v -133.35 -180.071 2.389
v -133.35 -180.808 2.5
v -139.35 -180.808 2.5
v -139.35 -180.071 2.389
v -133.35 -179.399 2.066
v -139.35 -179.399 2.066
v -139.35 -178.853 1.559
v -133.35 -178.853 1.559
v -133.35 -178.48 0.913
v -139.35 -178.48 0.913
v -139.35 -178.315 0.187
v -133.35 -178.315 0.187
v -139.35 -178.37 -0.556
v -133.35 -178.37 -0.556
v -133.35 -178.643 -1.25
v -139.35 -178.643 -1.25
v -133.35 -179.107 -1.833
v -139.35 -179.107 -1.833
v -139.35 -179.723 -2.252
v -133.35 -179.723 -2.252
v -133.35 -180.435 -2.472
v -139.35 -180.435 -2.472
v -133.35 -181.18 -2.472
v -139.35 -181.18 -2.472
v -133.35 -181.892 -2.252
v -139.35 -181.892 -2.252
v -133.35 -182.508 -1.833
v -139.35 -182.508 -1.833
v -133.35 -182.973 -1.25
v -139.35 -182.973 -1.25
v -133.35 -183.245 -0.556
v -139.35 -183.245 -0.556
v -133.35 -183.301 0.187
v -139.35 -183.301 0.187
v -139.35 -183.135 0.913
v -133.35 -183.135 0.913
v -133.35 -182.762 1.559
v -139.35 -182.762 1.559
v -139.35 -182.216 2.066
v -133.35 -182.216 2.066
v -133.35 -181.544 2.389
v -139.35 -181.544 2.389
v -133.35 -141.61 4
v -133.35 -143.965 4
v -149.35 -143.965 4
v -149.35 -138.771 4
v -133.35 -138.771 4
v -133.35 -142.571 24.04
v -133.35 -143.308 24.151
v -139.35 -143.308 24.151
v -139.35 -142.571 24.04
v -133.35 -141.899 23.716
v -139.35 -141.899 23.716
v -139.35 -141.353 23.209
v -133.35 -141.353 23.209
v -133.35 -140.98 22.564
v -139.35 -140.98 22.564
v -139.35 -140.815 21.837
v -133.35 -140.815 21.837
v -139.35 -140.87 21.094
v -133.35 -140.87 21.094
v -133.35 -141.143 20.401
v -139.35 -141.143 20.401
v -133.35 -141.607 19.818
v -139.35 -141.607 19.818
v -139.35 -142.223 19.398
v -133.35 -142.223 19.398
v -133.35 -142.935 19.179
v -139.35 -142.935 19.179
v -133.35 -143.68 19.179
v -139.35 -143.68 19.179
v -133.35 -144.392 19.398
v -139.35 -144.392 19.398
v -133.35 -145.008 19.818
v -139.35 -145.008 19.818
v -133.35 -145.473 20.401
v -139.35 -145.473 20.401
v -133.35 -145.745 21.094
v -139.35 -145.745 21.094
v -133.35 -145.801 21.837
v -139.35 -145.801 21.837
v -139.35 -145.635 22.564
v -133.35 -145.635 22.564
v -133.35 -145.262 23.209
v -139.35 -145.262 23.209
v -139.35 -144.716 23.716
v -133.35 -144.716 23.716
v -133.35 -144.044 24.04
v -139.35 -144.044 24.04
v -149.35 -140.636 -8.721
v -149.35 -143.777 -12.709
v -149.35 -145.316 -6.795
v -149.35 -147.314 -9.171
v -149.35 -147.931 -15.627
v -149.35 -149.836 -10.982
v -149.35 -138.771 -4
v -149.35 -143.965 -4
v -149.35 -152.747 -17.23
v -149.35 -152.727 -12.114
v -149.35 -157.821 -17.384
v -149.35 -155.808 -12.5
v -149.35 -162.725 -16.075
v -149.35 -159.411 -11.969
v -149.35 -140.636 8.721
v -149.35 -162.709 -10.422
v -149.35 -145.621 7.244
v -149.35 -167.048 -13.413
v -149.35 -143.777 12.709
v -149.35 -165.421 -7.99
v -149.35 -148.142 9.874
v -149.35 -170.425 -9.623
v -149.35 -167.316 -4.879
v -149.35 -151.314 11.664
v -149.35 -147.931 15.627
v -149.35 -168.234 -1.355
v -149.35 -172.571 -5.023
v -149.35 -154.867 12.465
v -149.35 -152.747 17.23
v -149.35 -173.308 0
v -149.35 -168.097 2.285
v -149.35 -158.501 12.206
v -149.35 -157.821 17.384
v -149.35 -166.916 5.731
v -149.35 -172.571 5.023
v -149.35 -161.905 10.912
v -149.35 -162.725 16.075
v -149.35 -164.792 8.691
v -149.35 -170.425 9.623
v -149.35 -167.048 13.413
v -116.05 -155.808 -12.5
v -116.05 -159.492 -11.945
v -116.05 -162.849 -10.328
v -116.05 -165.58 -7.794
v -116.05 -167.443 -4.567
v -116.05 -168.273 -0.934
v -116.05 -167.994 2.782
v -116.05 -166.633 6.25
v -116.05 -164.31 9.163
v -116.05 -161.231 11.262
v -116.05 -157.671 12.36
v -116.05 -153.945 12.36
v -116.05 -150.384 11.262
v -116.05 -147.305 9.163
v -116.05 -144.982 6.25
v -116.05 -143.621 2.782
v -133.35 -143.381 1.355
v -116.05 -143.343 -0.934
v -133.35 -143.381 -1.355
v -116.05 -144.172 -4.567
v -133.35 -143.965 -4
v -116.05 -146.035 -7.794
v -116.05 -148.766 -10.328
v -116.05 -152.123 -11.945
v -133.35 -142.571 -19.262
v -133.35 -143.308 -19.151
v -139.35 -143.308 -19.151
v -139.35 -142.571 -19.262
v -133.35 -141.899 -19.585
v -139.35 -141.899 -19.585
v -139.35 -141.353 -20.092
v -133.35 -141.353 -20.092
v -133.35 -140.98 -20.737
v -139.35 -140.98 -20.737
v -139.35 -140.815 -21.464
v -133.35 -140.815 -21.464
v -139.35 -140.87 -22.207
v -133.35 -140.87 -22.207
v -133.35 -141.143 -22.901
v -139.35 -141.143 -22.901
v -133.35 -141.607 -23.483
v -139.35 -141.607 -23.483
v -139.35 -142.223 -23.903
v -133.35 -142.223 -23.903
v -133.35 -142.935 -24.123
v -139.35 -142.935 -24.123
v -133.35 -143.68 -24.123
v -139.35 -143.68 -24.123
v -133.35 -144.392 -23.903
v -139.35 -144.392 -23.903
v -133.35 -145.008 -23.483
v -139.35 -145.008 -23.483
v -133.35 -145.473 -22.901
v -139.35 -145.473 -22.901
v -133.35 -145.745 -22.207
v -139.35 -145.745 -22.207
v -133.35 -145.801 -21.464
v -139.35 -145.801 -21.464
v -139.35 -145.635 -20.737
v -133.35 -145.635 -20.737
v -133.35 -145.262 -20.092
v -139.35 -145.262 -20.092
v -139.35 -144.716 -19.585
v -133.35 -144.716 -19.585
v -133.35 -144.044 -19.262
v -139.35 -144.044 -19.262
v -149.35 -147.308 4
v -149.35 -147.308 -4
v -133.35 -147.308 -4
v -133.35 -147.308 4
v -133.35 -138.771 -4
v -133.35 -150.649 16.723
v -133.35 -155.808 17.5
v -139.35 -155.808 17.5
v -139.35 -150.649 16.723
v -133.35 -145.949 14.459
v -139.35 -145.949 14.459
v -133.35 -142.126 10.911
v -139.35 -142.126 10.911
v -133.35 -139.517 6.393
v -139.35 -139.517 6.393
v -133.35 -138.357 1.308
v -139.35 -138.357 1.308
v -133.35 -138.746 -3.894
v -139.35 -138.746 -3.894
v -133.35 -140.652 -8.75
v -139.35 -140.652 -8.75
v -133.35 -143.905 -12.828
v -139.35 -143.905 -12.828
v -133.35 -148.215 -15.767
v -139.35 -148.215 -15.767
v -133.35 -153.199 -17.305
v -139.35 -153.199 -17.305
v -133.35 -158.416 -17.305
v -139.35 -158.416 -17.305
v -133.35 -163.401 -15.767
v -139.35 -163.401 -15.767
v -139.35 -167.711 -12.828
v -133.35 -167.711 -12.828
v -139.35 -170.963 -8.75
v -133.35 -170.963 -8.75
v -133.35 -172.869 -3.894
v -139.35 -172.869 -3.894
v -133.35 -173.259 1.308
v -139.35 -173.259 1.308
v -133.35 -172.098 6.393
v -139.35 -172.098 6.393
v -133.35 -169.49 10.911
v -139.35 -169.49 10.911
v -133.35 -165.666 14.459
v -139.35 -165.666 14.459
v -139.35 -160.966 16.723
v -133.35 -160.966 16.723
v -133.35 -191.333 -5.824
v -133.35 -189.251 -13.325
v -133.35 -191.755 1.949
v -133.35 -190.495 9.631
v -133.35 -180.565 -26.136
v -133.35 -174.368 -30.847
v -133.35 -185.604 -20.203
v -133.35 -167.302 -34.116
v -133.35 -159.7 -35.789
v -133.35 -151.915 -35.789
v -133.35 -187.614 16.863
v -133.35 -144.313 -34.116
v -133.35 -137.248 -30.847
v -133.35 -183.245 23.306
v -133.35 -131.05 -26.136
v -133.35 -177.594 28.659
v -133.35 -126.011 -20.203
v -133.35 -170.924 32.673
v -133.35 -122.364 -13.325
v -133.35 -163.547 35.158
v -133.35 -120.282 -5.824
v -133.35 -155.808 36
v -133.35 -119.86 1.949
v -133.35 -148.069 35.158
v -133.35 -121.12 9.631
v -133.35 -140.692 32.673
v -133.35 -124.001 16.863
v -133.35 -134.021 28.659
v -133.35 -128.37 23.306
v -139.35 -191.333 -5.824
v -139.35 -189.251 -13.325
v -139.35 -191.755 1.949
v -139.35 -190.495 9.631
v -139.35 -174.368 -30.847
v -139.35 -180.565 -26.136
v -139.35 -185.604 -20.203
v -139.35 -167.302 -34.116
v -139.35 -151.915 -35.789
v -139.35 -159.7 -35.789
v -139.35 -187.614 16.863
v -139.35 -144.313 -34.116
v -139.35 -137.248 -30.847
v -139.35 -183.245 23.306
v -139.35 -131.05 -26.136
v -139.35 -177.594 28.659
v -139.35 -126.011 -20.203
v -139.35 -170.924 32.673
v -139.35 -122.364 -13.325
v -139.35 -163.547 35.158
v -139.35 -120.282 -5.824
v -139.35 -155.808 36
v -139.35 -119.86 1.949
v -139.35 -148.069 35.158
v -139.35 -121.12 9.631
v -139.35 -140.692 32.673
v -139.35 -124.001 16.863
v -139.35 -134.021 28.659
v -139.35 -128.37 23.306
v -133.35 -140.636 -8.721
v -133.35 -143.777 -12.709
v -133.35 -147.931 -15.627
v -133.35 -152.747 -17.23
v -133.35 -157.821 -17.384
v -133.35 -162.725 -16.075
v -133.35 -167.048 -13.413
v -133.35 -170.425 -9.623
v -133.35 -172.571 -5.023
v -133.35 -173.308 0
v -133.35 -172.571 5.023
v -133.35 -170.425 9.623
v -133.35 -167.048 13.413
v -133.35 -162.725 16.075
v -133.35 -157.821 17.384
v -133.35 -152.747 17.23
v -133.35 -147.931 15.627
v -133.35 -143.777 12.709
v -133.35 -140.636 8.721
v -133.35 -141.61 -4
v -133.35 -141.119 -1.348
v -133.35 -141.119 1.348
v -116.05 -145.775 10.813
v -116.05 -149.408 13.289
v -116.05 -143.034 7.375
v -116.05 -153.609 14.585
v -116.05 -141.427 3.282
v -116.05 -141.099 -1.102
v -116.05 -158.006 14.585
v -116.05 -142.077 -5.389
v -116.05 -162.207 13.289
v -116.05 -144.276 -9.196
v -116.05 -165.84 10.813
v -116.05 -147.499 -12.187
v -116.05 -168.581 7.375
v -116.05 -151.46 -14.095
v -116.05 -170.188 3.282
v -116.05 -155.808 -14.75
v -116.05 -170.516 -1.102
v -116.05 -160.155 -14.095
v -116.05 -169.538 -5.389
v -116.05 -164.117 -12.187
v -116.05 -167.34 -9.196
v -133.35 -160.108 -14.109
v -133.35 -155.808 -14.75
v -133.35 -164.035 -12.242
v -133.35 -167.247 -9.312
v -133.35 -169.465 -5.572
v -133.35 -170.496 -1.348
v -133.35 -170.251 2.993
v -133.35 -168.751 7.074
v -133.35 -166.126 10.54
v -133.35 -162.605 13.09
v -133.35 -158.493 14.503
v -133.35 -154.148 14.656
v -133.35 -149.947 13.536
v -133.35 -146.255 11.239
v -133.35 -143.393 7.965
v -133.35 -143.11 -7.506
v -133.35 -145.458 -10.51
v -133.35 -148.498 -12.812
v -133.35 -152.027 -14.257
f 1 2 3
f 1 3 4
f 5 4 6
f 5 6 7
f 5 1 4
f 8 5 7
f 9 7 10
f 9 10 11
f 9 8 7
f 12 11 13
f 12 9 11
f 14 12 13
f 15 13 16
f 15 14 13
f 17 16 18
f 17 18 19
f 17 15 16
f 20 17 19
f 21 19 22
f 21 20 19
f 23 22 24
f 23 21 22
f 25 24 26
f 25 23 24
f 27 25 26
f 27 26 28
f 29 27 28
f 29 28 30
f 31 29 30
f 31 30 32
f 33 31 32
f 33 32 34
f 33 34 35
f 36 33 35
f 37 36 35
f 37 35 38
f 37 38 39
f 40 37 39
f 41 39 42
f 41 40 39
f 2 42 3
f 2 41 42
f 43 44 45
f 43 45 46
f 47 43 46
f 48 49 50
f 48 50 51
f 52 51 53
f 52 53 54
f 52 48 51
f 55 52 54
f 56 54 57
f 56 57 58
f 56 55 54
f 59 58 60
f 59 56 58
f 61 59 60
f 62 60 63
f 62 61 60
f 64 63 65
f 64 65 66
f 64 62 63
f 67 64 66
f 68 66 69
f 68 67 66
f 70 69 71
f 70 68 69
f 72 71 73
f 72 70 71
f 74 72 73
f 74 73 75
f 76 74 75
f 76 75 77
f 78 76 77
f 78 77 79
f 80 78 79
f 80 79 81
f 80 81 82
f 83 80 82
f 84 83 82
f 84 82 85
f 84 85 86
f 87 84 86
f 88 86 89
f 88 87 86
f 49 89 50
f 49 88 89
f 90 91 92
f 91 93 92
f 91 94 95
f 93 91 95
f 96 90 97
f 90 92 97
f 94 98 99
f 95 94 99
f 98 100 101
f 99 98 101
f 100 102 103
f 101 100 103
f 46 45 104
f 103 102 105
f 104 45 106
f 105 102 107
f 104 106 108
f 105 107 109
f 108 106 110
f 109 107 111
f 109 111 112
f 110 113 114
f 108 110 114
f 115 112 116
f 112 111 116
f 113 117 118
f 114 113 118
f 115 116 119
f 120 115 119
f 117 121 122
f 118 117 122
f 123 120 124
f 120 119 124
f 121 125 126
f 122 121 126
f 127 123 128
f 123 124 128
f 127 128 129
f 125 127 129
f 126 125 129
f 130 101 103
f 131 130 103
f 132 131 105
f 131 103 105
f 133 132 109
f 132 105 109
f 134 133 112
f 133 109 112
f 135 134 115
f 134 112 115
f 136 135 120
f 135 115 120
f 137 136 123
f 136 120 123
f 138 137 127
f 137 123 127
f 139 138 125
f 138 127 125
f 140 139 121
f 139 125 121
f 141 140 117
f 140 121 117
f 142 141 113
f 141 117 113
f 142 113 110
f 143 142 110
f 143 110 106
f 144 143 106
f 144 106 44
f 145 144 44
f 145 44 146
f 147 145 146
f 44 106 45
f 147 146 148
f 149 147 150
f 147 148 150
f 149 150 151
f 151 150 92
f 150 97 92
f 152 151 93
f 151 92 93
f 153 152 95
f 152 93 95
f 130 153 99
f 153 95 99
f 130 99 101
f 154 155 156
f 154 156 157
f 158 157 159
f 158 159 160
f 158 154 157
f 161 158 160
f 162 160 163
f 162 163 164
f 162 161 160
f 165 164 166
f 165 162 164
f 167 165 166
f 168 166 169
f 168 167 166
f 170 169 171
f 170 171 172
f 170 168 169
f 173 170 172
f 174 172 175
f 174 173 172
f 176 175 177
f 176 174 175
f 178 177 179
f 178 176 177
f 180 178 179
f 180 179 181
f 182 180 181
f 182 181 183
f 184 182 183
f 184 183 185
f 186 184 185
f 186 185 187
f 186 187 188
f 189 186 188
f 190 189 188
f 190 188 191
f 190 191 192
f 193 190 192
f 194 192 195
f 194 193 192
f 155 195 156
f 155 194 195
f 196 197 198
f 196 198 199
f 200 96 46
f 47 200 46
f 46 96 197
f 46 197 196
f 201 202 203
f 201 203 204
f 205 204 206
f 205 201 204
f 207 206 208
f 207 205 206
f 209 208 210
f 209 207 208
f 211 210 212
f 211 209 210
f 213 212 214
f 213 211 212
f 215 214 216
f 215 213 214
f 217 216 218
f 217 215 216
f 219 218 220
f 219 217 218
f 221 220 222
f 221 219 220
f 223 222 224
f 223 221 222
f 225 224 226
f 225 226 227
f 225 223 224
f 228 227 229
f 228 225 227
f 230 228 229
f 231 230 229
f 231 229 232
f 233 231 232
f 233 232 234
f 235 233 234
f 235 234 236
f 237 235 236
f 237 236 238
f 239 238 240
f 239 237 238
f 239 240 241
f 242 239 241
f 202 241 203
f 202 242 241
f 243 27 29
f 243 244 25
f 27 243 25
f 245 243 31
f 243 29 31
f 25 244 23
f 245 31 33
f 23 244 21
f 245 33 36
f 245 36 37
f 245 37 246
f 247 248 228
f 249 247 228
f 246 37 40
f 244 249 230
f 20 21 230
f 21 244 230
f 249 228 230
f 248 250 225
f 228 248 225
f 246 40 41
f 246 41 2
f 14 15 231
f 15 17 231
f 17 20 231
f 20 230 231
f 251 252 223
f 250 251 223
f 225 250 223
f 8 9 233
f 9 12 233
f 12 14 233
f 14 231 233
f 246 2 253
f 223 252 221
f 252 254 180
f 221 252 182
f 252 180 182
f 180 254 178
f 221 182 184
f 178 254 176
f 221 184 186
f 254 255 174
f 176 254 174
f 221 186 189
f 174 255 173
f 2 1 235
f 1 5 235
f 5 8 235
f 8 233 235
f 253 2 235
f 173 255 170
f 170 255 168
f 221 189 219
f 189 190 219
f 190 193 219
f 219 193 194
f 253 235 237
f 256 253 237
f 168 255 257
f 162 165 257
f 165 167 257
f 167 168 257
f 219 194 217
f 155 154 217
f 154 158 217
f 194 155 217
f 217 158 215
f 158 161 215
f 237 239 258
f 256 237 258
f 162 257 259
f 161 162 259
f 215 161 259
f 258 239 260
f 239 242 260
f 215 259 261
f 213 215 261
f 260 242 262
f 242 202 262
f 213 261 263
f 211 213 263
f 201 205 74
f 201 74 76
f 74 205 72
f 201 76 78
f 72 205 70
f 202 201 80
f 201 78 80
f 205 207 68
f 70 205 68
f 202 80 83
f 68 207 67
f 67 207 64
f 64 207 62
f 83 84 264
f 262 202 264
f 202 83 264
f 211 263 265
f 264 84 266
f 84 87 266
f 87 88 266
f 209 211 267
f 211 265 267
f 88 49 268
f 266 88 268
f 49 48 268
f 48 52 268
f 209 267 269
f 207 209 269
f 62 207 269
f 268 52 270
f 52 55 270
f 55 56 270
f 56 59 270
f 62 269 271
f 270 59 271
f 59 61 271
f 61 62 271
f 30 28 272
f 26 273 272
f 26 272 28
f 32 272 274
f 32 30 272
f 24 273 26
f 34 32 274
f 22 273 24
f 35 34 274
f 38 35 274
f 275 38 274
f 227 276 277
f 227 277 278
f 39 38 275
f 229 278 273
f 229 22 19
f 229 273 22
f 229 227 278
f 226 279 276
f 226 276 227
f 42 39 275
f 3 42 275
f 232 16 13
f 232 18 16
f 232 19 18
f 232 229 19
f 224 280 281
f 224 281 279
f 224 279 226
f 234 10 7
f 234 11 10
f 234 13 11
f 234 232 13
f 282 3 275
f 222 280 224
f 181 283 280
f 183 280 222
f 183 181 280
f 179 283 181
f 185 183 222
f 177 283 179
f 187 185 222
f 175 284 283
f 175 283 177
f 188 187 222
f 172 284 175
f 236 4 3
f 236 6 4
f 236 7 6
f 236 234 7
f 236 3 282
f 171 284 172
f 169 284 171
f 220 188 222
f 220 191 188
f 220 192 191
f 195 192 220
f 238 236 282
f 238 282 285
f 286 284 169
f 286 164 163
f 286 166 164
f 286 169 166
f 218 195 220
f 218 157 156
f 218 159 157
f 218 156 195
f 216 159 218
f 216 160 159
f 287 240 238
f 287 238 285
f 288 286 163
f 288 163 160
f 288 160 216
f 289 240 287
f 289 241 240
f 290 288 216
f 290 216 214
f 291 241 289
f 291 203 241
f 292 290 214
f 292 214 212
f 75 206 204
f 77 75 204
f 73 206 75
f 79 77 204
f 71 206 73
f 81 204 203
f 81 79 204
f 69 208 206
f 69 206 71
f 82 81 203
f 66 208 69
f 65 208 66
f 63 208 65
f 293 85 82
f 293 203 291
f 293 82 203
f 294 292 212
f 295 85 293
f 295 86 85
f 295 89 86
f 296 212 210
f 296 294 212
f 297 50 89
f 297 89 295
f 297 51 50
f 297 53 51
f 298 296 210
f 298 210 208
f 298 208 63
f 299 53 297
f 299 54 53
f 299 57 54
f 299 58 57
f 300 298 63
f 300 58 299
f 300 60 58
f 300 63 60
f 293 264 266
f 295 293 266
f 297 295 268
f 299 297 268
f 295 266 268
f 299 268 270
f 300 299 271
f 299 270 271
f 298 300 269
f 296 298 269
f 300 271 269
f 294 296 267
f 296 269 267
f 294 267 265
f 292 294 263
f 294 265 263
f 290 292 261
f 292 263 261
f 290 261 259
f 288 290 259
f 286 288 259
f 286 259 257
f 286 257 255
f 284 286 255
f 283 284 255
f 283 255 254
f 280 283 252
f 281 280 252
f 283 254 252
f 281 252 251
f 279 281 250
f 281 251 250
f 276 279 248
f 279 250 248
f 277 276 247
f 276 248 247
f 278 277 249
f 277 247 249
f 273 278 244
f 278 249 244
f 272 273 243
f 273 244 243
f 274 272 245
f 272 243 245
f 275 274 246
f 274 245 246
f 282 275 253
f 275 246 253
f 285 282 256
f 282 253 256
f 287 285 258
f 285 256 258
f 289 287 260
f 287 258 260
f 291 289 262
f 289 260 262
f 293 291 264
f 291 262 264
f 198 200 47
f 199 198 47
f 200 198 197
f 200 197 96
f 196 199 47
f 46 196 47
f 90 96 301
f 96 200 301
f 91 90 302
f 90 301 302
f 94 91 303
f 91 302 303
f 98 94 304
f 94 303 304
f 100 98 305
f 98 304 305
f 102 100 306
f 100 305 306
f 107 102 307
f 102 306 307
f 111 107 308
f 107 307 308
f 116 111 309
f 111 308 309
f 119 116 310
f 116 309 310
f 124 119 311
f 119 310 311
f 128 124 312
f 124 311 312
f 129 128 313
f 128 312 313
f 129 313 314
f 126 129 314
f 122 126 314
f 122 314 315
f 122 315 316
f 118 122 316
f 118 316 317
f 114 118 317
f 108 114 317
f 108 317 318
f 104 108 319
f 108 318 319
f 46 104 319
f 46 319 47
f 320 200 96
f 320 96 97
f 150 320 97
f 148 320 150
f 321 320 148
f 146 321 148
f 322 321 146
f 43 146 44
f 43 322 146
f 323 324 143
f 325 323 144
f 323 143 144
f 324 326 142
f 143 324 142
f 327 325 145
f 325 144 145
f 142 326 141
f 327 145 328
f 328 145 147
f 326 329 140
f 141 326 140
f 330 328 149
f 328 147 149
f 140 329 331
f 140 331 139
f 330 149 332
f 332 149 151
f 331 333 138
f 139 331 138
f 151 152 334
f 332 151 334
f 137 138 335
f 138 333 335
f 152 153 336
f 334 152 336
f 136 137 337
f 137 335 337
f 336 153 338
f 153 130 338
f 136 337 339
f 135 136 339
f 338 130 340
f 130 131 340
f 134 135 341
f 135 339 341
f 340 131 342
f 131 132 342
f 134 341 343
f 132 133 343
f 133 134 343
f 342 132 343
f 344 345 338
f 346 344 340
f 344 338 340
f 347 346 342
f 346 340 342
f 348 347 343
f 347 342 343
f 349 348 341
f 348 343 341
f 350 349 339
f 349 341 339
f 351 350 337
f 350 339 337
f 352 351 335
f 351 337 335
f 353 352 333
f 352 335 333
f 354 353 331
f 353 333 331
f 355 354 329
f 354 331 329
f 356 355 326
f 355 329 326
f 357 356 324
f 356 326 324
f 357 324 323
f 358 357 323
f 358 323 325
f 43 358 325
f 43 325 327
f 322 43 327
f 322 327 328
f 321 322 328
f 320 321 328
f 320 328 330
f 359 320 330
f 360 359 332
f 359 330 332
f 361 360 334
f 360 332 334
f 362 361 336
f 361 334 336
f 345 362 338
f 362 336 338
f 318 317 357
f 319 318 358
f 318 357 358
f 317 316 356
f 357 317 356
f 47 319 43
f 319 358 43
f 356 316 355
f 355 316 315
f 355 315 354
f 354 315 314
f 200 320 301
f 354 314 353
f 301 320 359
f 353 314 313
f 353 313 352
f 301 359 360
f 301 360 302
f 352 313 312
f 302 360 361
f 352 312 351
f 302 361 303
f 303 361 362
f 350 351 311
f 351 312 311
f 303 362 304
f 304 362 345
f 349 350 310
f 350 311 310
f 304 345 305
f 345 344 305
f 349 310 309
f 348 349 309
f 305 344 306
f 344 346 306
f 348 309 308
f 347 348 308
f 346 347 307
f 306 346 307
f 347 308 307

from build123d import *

# Parameters (mm, degrees)
SKETCH_2_R             = 36
SKETCH_2_R_2           = 17.5
SKETCH_2_R_3           = 2.5
SM_BASE_FLANGE_1_DEPTH = 6
CUT_EXTRUDE_START      = -16
CUT_EXTRUDE_1_DEPTH    = 16
SKETCH_9_W             = 8
SKETCH_9_H             = 8.536725037
EXTRUDE_1_DEPTH        = 16


# Sheet-metal steps are written as plain solids
with BuildPart() as part:
    # Sketch 1 → Повернуть1 (revolve)
    with BuildSketch(Plane.XY, mode=Mode.PRIVATE) as revolve_1_sk:
        Polygon((-116.05, -143.307573628), (-149.35, -143.307573628), (-149.35, -138.307573628), (-133.35, -138.307573628), (-133.35, -141.057573628), (-116.05, -141.057573628), align=None)
    revolve(revolve_1_sk.sketch.rotate(Axis((-122.60264377, -155.807573628, 0), (-1, 0, 0)), 90), axis=Axis((-122.60264377, -155.807573628, 0), (-1, 0, 0)))

    # Эскиз8 → Вырез-Вытянуть1 (cut)
    with BuildSketch(Plane.ZY.offset(149.35).offset(CUT_EXTRUDE_START)):
        with BuildLine():
            Line((-4, -138.770848591), (-4, -147.307573628))
            Line((-4, -147.307573628), (4, -147.307573628))
            Line((4, -147.307573628), (4, -138.770848591))
            ThreePointArc((4, -138.770848591), (0, -138.307573628), (-4, -138.770848591))
        make_face()
    extrude(amount=CUT_EXTRUDE_1_DEPTH, mode=Mode.SUBTRACT)


with BuildPart() as body_2:
    # Sketch 2 → Базовая кромка1 (new body)
    with BuildSketch(Plane.ZY.offset(133.35)):
        with Locations((0, -155.807573628)):
            Circle(SKETCH_2_R)
        with Locations((0, -155.807573628)):
            Circle(SKETCH_2_R_2, mode=Mode.SUBTRACT)
        with Locations((-21.650635095, -143.307573628)):
            Circle(SKETCH_2_R_3, mode=Mode.SUBTRACT)
        with Locations((0, -180.807573628)):
            Circle(SKETCH_2_R_3, mode=Mode.SUBTRACT)
        with Locations((21.650635095, -143.307573628)):
            Circle(SKETCH_2_R_3, mode=Mode.SUBTRACT)
    extrude(amount=SM_BASE_FLANGE_1_DEPTH)


with BuildPart() as body_3:
    # Эскиз9 → Бобышка-Вытянуть1 (new body)
    with BuildSketch(Plane.ZY.offset(149.35)):
        with Locations((0, -143.03921111)):
            Rectangle(SKETCH_9_W, SKETCH_9_H)
    extrude(amount=-EXTRUDE_1_DEPTH)


solid = Compound([part.part, body_2.part, body_3.part])
